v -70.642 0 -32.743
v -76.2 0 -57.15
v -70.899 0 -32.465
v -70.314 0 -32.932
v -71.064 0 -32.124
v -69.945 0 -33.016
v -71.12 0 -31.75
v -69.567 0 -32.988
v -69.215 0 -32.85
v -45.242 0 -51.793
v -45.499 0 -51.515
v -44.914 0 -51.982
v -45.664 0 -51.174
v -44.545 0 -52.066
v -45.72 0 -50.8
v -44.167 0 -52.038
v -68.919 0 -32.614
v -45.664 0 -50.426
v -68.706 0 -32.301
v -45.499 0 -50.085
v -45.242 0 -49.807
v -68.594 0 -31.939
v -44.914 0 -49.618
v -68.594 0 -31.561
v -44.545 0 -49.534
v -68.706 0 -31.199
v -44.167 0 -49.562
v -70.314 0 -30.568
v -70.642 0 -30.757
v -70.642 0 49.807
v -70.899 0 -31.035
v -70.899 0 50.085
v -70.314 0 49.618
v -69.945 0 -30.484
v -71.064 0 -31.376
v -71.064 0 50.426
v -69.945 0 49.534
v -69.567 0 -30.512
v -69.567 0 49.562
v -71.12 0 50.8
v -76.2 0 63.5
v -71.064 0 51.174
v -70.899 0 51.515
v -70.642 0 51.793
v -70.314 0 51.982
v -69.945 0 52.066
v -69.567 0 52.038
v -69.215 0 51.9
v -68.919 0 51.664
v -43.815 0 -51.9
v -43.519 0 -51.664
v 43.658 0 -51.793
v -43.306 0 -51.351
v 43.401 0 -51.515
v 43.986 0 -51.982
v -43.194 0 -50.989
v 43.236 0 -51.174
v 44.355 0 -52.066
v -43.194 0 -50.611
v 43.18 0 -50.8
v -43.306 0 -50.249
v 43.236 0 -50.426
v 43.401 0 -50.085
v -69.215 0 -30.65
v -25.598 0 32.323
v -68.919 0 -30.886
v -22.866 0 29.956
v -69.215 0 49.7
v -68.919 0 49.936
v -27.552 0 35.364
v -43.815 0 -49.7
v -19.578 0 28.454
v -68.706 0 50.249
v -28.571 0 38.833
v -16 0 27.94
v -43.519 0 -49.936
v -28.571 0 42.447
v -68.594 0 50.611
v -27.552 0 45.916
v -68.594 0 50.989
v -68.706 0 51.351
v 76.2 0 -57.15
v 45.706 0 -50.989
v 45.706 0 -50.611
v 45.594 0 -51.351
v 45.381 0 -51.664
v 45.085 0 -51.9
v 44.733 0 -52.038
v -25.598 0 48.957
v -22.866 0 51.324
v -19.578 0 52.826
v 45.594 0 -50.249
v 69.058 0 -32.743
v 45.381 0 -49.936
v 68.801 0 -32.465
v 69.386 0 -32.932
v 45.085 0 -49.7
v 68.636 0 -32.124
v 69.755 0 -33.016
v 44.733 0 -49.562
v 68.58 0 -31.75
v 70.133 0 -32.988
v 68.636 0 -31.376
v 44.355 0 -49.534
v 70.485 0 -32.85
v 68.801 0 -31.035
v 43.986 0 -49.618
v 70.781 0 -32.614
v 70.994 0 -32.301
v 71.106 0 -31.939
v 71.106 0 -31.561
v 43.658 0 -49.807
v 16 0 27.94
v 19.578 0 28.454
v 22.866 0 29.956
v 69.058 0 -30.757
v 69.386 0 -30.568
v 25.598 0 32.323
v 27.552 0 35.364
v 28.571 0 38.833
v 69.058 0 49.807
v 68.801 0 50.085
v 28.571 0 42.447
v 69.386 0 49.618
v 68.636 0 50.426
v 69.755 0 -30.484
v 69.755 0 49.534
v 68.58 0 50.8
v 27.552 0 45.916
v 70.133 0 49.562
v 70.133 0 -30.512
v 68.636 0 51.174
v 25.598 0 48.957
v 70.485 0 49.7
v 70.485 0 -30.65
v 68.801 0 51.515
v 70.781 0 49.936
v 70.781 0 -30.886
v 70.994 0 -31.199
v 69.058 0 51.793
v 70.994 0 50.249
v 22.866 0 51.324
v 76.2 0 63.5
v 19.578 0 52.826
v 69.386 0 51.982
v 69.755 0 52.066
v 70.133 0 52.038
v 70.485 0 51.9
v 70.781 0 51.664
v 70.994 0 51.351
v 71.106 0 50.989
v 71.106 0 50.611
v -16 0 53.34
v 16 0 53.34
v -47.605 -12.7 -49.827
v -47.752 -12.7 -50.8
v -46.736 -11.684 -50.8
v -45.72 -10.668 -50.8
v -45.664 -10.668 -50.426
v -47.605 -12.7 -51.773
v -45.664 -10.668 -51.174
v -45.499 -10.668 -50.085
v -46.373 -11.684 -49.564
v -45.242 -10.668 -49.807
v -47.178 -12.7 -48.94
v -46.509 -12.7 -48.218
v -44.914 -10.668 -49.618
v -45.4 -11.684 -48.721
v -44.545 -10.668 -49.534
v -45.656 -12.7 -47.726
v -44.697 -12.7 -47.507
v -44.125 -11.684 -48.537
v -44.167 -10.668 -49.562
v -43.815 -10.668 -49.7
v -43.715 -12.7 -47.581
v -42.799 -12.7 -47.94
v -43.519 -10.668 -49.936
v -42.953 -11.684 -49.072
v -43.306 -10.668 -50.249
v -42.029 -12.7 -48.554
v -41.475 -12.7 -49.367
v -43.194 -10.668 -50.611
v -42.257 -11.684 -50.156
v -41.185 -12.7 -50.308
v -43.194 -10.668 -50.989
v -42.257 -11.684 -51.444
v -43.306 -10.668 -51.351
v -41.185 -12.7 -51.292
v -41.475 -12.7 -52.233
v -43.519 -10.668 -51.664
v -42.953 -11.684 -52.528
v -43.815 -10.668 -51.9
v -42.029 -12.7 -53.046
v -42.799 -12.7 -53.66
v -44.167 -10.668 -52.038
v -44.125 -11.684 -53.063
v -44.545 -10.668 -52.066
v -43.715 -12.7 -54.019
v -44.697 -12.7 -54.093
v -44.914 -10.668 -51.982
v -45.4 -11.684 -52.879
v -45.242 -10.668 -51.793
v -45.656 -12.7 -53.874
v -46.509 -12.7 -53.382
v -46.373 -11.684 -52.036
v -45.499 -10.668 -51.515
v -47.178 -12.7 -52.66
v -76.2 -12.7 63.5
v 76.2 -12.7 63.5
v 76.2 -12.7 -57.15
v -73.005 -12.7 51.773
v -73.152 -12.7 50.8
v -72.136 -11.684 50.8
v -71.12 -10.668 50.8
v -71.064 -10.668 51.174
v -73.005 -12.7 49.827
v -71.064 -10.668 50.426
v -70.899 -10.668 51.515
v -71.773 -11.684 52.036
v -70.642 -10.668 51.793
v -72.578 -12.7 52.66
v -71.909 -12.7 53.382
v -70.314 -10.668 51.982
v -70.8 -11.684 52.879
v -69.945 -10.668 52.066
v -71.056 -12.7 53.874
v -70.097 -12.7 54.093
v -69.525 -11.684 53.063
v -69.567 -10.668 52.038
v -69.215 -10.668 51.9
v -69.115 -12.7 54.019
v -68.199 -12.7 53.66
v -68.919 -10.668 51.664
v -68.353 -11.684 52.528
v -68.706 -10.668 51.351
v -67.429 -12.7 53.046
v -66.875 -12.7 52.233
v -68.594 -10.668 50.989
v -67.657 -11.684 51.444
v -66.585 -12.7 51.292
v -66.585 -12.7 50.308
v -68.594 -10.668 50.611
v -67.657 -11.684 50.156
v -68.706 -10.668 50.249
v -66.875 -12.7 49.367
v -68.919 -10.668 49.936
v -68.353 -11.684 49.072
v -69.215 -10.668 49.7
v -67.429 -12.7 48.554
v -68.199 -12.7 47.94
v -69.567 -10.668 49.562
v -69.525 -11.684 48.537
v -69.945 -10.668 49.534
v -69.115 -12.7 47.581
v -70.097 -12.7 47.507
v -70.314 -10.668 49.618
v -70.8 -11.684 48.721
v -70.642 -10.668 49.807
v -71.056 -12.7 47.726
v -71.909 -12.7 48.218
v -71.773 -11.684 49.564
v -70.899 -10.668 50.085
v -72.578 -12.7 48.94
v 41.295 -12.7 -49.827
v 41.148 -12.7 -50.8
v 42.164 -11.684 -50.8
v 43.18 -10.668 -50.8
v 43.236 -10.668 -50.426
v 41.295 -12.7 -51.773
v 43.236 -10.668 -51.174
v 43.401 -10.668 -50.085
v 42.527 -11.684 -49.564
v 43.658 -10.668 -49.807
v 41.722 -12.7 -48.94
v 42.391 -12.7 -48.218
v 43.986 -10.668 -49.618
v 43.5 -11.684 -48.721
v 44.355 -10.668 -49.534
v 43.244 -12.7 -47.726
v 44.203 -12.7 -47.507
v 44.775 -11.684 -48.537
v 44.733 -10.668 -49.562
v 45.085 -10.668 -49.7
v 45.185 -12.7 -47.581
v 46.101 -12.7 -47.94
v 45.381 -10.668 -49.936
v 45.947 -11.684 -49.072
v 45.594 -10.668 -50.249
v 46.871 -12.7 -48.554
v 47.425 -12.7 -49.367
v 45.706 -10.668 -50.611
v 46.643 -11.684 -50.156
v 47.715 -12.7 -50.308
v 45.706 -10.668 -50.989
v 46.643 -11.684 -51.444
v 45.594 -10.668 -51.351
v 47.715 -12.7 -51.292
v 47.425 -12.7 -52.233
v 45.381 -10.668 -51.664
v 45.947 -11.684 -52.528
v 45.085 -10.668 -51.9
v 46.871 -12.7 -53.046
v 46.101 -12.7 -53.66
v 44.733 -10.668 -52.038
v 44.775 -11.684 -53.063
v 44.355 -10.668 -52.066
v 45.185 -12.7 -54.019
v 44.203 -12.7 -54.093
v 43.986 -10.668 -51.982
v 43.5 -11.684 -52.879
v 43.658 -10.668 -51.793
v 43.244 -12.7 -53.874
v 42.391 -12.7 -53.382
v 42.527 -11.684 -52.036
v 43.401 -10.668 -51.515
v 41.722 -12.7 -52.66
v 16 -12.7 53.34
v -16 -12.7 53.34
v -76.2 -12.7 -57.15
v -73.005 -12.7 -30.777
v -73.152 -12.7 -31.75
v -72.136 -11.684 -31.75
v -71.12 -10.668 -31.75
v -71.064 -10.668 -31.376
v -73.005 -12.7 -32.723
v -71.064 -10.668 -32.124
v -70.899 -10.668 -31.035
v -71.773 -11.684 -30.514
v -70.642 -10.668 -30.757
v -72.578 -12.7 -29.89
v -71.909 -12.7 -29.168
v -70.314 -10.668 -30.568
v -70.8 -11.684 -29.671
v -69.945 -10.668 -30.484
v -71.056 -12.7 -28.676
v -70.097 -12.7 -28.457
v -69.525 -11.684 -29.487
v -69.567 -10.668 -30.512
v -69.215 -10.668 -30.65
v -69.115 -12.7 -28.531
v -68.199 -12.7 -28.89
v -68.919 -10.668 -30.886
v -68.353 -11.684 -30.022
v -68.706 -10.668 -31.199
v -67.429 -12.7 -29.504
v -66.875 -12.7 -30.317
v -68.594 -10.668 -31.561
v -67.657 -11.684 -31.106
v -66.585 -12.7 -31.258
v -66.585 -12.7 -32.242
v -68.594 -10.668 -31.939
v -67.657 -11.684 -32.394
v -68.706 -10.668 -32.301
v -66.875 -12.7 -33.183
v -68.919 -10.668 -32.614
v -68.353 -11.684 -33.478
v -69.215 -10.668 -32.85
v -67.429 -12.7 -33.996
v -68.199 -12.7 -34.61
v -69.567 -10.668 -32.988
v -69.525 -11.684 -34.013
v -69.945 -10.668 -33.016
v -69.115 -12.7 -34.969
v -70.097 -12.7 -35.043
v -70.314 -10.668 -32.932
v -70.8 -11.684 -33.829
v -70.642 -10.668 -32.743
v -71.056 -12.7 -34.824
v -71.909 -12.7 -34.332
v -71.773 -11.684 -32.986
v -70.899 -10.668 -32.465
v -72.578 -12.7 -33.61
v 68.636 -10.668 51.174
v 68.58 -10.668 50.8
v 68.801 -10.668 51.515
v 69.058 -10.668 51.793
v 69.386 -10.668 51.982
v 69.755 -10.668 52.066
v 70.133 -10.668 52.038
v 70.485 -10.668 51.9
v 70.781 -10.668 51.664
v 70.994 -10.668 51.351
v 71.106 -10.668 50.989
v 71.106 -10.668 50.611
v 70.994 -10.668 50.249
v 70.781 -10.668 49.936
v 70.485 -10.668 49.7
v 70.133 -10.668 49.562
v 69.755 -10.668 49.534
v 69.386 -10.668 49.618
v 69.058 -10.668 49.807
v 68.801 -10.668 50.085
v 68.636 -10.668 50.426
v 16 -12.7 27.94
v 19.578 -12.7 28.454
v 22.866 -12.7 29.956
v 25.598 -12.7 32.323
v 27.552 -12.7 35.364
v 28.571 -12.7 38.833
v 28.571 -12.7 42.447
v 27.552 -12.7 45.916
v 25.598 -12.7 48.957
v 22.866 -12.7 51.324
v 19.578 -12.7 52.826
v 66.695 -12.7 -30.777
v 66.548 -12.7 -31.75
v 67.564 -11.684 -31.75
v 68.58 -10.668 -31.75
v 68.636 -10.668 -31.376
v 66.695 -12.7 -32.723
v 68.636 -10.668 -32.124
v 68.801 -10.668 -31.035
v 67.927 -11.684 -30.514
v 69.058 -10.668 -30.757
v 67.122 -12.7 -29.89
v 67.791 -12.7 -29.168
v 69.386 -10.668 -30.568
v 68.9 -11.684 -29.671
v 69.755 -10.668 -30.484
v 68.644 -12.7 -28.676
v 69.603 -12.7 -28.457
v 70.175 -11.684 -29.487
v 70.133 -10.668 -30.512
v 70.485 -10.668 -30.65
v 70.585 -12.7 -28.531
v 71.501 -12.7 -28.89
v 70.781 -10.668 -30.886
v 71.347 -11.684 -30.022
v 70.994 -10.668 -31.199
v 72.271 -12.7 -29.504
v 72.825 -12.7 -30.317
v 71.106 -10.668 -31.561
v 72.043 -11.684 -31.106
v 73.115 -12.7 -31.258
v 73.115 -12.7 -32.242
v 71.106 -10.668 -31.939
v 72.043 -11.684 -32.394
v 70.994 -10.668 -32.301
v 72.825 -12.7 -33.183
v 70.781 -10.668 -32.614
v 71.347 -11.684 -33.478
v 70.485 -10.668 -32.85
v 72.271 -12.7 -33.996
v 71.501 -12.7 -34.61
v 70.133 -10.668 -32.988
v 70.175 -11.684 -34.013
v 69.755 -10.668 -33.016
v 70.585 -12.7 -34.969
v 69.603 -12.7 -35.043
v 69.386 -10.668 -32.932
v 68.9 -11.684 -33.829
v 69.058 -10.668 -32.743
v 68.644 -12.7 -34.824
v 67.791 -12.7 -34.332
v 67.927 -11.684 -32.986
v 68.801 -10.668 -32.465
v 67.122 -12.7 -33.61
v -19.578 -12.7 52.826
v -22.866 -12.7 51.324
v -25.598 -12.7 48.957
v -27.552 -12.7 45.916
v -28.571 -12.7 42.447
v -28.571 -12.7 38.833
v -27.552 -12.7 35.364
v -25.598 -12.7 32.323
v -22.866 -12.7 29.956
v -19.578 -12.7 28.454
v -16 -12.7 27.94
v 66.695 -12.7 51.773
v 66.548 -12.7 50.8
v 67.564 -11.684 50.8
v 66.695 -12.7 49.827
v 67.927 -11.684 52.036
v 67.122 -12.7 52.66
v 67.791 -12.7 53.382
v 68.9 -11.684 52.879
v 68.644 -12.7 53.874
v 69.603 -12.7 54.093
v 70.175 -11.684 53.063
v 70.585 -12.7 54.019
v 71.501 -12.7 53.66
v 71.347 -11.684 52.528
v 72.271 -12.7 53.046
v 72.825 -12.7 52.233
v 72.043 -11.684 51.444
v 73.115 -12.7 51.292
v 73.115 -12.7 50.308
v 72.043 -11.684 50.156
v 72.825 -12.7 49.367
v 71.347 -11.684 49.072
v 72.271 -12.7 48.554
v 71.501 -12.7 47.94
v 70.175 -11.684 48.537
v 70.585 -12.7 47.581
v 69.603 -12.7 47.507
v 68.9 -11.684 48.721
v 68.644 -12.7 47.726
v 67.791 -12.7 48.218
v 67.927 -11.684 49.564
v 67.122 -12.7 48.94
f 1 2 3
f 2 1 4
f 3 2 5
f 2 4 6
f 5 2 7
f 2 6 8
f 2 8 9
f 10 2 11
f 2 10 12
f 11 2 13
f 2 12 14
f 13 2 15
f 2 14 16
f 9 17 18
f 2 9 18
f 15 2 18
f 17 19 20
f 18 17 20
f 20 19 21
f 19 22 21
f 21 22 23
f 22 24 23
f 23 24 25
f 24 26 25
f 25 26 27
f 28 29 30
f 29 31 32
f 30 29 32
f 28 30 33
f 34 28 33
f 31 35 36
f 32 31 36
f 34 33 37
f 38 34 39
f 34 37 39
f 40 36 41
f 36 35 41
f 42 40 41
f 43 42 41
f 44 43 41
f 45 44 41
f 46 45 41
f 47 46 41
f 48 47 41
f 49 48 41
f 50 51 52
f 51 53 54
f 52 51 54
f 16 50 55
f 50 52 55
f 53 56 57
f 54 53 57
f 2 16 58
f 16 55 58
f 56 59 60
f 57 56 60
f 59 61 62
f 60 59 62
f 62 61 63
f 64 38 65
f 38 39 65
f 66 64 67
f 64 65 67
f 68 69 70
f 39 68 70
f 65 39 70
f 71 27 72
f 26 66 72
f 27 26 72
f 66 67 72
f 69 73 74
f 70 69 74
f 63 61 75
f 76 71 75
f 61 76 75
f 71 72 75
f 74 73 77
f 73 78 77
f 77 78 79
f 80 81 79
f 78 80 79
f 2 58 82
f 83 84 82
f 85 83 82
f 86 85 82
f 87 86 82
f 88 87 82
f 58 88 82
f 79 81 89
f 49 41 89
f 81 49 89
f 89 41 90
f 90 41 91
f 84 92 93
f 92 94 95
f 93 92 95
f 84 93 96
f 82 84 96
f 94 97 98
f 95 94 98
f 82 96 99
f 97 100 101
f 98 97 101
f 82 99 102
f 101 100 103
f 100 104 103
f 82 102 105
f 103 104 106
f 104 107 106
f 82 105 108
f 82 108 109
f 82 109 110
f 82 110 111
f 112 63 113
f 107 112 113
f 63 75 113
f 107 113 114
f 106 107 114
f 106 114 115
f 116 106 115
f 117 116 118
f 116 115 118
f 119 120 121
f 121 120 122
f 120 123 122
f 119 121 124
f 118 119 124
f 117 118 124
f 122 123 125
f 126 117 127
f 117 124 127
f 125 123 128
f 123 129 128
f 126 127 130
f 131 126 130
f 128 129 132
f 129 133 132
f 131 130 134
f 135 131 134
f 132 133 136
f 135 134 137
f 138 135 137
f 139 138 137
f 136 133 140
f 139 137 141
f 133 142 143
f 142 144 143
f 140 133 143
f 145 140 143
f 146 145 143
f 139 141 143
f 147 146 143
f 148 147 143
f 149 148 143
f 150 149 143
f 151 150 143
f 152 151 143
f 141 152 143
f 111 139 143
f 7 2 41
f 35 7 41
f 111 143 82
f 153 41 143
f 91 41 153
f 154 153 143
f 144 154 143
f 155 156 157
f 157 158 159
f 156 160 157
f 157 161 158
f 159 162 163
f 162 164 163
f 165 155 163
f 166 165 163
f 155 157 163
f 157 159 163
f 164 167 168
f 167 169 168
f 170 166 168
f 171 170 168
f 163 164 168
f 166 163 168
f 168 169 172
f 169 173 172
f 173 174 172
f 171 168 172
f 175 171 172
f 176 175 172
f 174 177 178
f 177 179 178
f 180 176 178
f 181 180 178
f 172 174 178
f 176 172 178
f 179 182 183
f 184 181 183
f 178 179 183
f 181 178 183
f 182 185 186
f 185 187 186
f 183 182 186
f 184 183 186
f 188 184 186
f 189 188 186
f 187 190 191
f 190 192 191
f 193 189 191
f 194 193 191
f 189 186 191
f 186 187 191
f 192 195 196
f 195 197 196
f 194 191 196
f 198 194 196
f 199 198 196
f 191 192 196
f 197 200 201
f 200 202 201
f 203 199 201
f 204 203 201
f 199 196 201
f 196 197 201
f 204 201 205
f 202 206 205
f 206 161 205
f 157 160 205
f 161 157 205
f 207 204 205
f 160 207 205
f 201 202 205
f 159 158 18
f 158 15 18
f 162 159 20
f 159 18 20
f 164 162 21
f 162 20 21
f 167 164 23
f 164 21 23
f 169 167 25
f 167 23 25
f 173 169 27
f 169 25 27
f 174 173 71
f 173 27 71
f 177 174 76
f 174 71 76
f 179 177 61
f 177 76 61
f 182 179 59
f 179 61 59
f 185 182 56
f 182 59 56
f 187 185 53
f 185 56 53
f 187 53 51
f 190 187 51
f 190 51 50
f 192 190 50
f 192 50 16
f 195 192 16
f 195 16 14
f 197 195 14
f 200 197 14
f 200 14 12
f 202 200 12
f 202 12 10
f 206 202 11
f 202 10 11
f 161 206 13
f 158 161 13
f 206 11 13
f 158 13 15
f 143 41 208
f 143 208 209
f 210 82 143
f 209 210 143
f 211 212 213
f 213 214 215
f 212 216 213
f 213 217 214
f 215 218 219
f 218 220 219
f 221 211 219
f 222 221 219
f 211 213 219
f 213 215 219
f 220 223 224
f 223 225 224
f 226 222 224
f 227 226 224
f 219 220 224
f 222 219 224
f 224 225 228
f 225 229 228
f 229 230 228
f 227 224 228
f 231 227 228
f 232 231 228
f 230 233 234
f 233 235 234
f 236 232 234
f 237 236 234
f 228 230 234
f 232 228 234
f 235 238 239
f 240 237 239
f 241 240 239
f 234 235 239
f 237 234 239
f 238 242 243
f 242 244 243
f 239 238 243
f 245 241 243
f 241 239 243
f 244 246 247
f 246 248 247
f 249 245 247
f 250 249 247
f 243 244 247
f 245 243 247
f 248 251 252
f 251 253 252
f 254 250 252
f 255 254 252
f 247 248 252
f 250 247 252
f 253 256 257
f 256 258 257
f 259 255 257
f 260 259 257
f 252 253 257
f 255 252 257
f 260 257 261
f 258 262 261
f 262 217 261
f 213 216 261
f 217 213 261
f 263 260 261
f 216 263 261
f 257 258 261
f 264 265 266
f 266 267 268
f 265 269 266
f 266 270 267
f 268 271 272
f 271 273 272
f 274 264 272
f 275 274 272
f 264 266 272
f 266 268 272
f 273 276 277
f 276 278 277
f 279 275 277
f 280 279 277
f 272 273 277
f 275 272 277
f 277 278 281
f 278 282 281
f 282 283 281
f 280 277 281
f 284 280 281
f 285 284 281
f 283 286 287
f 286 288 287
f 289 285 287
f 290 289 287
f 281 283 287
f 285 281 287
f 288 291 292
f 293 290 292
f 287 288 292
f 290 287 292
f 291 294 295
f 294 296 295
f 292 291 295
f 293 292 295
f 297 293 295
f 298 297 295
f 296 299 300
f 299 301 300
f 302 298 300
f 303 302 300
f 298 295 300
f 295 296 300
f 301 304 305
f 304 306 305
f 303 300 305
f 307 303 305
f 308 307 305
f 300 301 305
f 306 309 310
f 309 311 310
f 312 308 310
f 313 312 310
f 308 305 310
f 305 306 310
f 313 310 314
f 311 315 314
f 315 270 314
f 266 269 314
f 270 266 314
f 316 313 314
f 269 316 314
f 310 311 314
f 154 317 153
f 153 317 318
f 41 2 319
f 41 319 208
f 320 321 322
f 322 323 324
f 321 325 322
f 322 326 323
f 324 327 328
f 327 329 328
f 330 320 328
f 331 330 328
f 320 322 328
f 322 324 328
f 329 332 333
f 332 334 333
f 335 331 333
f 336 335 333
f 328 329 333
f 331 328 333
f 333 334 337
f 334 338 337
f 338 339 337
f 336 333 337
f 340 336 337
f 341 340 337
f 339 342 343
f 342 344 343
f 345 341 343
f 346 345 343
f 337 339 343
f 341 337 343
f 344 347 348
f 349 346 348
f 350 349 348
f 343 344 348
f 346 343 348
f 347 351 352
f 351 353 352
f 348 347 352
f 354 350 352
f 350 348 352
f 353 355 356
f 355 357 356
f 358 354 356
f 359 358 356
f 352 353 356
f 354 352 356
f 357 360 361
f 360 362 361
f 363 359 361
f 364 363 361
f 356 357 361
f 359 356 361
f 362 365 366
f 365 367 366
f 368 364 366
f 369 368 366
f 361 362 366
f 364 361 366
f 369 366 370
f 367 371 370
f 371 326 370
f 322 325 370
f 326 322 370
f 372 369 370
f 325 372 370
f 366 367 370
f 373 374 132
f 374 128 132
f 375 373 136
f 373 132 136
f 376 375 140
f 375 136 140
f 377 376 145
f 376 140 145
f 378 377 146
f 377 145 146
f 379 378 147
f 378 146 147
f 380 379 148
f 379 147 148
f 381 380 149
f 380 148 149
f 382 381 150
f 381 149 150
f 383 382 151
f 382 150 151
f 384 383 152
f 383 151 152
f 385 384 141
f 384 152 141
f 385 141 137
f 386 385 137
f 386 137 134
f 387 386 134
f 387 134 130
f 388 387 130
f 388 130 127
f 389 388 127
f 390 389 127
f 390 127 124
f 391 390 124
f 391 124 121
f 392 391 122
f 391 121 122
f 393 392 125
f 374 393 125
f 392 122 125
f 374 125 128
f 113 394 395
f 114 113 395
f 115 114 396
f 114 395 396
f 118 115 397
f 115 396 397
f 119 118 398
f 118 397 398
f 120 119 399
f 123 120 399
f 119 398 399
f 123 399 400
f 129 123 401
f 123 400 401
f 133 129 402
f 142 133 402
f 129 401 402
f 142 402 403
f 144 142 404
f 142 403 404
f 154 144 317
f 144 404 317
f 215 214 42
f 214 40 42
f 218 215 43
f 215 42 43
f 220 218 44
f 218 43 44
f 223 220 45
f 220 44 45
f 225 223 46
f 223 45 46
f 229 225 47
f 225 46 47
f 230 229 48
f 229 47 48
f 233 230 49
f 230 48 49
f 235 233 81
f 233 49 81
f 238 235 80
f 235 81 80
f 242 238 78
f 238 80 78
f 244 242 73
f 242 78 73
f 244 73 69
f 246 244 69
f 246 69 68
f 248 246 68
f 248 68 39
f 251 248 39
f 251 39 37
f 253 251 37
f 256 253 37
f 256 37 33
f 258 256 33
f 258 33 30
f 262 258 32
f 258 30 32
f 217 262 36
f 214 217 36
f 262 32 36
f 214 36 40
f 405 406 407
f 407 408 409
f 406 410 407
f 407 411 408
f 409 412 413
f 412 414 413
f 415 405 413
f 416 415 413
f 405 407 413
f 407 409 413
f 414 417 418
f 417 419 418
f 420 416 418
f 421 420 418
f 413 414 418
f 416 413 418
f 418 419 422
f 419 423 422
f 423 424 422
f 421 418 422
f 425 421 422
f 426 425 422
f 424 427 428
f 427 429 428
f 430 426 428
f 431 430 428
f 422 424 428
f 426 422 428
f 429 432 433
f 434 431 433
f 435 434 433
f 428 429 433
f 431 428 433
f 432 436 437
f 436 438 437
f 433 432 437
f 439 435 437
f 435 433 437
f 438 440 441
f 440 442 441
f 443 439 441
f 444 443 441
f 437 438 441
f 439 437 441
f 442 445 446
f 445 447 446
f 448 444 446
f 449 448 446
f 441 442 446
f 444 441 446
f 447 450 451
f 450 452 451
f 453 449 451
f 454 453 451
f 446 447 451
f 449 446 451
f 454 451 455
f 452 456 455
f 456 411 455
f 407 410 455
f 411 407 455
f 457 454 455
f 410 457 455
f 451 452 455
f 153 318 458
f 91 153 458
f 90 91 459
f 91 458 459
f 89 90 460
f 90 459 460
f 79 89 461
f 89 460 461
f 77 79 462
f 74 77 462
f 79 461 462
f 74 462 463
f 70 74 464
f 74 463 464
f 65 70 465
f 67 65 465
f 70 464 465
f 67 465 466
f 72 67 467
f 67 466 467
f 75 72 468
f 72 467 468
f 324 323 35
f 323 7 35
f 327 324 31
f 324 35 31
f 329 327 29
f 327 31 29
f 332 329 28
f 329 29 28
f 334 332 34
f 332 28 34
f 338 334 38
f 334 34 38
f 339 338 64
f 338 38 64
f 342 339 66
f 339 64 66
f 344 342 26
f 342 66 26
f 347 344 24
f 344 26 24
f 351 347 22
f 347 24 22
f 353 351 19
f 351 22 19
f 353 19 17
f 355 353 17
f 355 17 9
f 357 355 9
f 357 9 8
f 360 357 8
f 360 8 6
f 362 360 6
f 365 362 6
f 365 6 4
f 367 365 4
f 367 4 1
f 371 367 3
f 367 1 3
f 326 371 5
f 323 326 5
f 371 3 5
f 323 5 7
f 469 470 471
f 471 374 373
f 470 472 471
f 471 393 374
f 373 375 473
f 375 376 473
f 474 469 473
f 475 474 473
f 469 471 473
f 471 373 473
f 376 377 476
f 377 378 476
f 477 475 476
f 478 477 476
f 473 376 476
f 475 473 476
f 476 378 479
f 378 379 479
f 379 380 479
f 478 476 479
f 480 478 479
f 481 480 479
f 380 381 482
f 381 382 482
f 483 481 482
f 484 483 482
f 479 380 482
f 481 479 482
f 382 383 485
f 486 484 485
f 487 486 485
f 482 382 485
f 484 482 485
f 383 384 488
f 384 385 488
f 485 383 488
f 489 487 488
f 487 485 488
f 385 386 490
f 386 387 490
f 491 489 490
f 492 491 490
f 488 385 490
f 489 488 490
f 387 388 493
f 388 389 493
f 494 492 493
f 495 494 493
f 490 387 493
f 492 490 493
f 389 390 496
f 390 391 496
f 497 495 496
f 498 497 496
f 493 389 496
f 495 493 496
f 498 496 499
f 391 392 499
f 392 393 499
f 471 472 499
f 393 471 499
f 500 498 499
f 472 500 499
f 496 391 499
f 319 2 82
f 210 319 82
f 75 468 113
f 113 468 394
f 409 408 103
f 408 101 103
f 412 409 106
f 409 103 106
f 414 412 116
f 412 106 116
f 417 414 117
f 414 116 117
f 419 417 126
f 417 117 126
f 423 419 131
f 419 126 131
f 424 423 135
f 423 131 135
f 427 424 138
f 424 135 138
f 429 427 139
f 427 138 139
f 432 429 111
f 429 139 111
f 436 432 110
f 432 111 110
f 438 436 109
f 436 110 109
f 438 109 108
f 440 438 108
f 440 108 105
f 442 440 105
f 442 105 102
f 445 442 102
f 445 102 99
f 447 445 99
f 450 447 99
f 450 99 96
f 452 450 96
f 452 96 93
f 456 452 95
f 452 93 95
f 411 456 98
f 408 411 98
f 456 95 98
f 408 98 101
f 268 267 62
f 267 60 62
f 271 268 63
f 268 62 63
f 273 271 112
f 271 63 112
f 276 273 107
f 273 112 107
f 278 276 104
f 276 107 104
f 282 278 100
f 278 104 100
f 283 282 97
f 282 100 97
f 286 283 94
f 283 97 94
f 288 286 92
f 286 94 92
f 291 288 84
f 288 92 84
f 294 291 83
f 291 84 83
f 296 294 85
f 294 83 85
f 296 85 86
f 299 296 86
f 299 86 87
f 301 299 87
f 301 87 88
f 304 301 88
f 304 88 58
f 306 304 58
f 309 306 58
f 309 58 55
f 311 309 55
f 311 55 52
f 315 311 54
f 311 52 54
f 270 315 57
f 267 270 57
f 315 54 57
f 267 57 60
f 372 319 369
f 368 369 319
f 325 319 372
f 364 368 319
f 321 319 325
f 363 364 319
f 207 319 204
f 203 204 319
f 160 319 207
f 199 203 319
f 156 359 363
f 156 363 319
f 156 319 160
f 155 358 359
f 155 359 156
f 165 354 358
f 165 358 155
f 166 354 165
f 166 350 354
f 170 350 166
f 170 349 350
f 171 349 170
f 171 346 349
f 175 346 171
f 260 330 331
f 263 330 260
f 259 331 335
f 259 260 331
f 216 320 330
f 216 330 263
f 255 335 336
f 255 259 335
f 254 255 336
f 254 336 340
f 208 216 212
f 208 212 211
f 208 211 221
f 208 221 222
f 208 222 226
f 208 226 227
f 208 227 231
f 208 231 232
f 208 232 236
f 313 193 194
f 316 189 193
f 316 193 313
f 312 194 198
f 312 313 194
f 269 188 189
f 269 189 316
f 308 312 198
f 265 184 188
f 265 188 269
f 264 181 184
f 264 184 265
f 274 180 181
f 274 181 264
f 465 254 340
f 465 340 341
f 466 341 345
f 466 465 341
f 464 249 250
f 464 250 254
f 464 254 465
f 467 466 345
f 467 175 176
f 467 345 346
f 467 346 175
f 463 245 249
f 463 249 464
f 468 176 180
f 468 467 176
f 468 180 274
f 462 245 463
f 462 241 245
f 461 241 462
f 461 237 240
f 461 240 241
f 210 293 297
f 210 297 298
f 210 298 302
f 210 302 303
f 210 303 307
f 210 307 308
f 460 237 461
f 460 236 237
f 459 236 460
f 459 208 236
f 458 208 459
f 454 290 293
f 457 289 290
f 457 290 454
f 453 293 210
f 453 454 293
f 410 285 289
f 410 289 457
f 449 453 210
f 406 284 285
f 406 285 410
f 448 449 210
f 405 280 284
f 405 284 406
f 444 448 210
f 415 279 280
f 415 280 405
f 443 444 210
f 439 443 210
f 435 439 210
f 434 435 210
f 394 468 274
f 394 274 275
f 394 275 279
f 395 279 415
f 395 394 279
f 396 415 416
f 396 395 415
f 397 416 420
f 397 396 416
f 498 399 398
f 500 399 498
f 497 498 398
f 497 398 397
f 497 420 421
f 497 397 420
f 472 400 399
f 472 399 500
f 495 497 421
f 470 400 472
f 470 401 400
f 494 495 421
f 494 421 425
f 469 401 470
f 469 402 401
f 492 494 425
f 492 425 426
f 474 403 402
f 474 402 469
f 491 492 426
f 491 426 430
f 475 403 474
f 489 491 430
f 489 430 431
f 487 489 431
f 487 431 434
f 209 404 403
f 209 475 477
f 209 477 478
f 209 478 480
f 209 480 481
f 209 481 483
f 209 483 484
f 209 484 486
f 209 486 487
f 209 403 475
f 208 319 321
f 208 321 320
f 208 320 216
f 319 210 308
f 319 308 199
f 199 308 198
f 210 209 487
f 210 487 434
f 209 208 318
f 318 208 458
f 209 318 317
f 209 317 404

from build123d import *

# Parameters (mm, degrees)
F0_W           = 152.4
F0_H           = 120.65
F1_DEPTH       = 12.7
F3_D           = 2.54
F3_CSINK_D     = 6.604
F3_CSINK_ANGLE = 90
F5_DEPTH       = 12.701


with BuildPart() as f1:
    # F0 (on Front) → F1 (new body)
    with BuildSketch(Plane.XZ):
        with Locations((0, 3.175)):
            Rectangle(F0_W, F0_H)
    extrude(amount=F1_DEPTH)

    # F3 (through all)
    with Locations(Plane.XZ.offset(12.7)):
        with Locations((-69.85, 50.8), (-69.85, -31.75), (-44.45, -50.8), (44.45, -50.8), (69.85, -31.75), (69.85, 50.8)):
            CounterSinkHole(F3_D / 2, F3_CSINK_D / 2, counter_sink_angle=F3_CSINK_ANGLE)

    # F4 (on face) → F5 (cut, through all)
    with BuildSketch(Plane.XZ.offset(12.7)):
        with BuildLine():
            Line((0, 53.34), (-16, 53.34))
            ThreePointArc((-16, 53.34), (-28.7, 40.64), (-16, 27.94))
            Line((-16, 27.94), (0, 27.94))
            Line((0, 27.94), (16, 27.94))
            ThreePointArc((16, 27.94), (28.7, 40.64), (16, 53.34))
            Line((16, 53.34), (0, 53.34))
        make_face()
    extrude(amount=-F5_DEPTH, mode=Mode.SUBTRACT)


solid = f1.part
